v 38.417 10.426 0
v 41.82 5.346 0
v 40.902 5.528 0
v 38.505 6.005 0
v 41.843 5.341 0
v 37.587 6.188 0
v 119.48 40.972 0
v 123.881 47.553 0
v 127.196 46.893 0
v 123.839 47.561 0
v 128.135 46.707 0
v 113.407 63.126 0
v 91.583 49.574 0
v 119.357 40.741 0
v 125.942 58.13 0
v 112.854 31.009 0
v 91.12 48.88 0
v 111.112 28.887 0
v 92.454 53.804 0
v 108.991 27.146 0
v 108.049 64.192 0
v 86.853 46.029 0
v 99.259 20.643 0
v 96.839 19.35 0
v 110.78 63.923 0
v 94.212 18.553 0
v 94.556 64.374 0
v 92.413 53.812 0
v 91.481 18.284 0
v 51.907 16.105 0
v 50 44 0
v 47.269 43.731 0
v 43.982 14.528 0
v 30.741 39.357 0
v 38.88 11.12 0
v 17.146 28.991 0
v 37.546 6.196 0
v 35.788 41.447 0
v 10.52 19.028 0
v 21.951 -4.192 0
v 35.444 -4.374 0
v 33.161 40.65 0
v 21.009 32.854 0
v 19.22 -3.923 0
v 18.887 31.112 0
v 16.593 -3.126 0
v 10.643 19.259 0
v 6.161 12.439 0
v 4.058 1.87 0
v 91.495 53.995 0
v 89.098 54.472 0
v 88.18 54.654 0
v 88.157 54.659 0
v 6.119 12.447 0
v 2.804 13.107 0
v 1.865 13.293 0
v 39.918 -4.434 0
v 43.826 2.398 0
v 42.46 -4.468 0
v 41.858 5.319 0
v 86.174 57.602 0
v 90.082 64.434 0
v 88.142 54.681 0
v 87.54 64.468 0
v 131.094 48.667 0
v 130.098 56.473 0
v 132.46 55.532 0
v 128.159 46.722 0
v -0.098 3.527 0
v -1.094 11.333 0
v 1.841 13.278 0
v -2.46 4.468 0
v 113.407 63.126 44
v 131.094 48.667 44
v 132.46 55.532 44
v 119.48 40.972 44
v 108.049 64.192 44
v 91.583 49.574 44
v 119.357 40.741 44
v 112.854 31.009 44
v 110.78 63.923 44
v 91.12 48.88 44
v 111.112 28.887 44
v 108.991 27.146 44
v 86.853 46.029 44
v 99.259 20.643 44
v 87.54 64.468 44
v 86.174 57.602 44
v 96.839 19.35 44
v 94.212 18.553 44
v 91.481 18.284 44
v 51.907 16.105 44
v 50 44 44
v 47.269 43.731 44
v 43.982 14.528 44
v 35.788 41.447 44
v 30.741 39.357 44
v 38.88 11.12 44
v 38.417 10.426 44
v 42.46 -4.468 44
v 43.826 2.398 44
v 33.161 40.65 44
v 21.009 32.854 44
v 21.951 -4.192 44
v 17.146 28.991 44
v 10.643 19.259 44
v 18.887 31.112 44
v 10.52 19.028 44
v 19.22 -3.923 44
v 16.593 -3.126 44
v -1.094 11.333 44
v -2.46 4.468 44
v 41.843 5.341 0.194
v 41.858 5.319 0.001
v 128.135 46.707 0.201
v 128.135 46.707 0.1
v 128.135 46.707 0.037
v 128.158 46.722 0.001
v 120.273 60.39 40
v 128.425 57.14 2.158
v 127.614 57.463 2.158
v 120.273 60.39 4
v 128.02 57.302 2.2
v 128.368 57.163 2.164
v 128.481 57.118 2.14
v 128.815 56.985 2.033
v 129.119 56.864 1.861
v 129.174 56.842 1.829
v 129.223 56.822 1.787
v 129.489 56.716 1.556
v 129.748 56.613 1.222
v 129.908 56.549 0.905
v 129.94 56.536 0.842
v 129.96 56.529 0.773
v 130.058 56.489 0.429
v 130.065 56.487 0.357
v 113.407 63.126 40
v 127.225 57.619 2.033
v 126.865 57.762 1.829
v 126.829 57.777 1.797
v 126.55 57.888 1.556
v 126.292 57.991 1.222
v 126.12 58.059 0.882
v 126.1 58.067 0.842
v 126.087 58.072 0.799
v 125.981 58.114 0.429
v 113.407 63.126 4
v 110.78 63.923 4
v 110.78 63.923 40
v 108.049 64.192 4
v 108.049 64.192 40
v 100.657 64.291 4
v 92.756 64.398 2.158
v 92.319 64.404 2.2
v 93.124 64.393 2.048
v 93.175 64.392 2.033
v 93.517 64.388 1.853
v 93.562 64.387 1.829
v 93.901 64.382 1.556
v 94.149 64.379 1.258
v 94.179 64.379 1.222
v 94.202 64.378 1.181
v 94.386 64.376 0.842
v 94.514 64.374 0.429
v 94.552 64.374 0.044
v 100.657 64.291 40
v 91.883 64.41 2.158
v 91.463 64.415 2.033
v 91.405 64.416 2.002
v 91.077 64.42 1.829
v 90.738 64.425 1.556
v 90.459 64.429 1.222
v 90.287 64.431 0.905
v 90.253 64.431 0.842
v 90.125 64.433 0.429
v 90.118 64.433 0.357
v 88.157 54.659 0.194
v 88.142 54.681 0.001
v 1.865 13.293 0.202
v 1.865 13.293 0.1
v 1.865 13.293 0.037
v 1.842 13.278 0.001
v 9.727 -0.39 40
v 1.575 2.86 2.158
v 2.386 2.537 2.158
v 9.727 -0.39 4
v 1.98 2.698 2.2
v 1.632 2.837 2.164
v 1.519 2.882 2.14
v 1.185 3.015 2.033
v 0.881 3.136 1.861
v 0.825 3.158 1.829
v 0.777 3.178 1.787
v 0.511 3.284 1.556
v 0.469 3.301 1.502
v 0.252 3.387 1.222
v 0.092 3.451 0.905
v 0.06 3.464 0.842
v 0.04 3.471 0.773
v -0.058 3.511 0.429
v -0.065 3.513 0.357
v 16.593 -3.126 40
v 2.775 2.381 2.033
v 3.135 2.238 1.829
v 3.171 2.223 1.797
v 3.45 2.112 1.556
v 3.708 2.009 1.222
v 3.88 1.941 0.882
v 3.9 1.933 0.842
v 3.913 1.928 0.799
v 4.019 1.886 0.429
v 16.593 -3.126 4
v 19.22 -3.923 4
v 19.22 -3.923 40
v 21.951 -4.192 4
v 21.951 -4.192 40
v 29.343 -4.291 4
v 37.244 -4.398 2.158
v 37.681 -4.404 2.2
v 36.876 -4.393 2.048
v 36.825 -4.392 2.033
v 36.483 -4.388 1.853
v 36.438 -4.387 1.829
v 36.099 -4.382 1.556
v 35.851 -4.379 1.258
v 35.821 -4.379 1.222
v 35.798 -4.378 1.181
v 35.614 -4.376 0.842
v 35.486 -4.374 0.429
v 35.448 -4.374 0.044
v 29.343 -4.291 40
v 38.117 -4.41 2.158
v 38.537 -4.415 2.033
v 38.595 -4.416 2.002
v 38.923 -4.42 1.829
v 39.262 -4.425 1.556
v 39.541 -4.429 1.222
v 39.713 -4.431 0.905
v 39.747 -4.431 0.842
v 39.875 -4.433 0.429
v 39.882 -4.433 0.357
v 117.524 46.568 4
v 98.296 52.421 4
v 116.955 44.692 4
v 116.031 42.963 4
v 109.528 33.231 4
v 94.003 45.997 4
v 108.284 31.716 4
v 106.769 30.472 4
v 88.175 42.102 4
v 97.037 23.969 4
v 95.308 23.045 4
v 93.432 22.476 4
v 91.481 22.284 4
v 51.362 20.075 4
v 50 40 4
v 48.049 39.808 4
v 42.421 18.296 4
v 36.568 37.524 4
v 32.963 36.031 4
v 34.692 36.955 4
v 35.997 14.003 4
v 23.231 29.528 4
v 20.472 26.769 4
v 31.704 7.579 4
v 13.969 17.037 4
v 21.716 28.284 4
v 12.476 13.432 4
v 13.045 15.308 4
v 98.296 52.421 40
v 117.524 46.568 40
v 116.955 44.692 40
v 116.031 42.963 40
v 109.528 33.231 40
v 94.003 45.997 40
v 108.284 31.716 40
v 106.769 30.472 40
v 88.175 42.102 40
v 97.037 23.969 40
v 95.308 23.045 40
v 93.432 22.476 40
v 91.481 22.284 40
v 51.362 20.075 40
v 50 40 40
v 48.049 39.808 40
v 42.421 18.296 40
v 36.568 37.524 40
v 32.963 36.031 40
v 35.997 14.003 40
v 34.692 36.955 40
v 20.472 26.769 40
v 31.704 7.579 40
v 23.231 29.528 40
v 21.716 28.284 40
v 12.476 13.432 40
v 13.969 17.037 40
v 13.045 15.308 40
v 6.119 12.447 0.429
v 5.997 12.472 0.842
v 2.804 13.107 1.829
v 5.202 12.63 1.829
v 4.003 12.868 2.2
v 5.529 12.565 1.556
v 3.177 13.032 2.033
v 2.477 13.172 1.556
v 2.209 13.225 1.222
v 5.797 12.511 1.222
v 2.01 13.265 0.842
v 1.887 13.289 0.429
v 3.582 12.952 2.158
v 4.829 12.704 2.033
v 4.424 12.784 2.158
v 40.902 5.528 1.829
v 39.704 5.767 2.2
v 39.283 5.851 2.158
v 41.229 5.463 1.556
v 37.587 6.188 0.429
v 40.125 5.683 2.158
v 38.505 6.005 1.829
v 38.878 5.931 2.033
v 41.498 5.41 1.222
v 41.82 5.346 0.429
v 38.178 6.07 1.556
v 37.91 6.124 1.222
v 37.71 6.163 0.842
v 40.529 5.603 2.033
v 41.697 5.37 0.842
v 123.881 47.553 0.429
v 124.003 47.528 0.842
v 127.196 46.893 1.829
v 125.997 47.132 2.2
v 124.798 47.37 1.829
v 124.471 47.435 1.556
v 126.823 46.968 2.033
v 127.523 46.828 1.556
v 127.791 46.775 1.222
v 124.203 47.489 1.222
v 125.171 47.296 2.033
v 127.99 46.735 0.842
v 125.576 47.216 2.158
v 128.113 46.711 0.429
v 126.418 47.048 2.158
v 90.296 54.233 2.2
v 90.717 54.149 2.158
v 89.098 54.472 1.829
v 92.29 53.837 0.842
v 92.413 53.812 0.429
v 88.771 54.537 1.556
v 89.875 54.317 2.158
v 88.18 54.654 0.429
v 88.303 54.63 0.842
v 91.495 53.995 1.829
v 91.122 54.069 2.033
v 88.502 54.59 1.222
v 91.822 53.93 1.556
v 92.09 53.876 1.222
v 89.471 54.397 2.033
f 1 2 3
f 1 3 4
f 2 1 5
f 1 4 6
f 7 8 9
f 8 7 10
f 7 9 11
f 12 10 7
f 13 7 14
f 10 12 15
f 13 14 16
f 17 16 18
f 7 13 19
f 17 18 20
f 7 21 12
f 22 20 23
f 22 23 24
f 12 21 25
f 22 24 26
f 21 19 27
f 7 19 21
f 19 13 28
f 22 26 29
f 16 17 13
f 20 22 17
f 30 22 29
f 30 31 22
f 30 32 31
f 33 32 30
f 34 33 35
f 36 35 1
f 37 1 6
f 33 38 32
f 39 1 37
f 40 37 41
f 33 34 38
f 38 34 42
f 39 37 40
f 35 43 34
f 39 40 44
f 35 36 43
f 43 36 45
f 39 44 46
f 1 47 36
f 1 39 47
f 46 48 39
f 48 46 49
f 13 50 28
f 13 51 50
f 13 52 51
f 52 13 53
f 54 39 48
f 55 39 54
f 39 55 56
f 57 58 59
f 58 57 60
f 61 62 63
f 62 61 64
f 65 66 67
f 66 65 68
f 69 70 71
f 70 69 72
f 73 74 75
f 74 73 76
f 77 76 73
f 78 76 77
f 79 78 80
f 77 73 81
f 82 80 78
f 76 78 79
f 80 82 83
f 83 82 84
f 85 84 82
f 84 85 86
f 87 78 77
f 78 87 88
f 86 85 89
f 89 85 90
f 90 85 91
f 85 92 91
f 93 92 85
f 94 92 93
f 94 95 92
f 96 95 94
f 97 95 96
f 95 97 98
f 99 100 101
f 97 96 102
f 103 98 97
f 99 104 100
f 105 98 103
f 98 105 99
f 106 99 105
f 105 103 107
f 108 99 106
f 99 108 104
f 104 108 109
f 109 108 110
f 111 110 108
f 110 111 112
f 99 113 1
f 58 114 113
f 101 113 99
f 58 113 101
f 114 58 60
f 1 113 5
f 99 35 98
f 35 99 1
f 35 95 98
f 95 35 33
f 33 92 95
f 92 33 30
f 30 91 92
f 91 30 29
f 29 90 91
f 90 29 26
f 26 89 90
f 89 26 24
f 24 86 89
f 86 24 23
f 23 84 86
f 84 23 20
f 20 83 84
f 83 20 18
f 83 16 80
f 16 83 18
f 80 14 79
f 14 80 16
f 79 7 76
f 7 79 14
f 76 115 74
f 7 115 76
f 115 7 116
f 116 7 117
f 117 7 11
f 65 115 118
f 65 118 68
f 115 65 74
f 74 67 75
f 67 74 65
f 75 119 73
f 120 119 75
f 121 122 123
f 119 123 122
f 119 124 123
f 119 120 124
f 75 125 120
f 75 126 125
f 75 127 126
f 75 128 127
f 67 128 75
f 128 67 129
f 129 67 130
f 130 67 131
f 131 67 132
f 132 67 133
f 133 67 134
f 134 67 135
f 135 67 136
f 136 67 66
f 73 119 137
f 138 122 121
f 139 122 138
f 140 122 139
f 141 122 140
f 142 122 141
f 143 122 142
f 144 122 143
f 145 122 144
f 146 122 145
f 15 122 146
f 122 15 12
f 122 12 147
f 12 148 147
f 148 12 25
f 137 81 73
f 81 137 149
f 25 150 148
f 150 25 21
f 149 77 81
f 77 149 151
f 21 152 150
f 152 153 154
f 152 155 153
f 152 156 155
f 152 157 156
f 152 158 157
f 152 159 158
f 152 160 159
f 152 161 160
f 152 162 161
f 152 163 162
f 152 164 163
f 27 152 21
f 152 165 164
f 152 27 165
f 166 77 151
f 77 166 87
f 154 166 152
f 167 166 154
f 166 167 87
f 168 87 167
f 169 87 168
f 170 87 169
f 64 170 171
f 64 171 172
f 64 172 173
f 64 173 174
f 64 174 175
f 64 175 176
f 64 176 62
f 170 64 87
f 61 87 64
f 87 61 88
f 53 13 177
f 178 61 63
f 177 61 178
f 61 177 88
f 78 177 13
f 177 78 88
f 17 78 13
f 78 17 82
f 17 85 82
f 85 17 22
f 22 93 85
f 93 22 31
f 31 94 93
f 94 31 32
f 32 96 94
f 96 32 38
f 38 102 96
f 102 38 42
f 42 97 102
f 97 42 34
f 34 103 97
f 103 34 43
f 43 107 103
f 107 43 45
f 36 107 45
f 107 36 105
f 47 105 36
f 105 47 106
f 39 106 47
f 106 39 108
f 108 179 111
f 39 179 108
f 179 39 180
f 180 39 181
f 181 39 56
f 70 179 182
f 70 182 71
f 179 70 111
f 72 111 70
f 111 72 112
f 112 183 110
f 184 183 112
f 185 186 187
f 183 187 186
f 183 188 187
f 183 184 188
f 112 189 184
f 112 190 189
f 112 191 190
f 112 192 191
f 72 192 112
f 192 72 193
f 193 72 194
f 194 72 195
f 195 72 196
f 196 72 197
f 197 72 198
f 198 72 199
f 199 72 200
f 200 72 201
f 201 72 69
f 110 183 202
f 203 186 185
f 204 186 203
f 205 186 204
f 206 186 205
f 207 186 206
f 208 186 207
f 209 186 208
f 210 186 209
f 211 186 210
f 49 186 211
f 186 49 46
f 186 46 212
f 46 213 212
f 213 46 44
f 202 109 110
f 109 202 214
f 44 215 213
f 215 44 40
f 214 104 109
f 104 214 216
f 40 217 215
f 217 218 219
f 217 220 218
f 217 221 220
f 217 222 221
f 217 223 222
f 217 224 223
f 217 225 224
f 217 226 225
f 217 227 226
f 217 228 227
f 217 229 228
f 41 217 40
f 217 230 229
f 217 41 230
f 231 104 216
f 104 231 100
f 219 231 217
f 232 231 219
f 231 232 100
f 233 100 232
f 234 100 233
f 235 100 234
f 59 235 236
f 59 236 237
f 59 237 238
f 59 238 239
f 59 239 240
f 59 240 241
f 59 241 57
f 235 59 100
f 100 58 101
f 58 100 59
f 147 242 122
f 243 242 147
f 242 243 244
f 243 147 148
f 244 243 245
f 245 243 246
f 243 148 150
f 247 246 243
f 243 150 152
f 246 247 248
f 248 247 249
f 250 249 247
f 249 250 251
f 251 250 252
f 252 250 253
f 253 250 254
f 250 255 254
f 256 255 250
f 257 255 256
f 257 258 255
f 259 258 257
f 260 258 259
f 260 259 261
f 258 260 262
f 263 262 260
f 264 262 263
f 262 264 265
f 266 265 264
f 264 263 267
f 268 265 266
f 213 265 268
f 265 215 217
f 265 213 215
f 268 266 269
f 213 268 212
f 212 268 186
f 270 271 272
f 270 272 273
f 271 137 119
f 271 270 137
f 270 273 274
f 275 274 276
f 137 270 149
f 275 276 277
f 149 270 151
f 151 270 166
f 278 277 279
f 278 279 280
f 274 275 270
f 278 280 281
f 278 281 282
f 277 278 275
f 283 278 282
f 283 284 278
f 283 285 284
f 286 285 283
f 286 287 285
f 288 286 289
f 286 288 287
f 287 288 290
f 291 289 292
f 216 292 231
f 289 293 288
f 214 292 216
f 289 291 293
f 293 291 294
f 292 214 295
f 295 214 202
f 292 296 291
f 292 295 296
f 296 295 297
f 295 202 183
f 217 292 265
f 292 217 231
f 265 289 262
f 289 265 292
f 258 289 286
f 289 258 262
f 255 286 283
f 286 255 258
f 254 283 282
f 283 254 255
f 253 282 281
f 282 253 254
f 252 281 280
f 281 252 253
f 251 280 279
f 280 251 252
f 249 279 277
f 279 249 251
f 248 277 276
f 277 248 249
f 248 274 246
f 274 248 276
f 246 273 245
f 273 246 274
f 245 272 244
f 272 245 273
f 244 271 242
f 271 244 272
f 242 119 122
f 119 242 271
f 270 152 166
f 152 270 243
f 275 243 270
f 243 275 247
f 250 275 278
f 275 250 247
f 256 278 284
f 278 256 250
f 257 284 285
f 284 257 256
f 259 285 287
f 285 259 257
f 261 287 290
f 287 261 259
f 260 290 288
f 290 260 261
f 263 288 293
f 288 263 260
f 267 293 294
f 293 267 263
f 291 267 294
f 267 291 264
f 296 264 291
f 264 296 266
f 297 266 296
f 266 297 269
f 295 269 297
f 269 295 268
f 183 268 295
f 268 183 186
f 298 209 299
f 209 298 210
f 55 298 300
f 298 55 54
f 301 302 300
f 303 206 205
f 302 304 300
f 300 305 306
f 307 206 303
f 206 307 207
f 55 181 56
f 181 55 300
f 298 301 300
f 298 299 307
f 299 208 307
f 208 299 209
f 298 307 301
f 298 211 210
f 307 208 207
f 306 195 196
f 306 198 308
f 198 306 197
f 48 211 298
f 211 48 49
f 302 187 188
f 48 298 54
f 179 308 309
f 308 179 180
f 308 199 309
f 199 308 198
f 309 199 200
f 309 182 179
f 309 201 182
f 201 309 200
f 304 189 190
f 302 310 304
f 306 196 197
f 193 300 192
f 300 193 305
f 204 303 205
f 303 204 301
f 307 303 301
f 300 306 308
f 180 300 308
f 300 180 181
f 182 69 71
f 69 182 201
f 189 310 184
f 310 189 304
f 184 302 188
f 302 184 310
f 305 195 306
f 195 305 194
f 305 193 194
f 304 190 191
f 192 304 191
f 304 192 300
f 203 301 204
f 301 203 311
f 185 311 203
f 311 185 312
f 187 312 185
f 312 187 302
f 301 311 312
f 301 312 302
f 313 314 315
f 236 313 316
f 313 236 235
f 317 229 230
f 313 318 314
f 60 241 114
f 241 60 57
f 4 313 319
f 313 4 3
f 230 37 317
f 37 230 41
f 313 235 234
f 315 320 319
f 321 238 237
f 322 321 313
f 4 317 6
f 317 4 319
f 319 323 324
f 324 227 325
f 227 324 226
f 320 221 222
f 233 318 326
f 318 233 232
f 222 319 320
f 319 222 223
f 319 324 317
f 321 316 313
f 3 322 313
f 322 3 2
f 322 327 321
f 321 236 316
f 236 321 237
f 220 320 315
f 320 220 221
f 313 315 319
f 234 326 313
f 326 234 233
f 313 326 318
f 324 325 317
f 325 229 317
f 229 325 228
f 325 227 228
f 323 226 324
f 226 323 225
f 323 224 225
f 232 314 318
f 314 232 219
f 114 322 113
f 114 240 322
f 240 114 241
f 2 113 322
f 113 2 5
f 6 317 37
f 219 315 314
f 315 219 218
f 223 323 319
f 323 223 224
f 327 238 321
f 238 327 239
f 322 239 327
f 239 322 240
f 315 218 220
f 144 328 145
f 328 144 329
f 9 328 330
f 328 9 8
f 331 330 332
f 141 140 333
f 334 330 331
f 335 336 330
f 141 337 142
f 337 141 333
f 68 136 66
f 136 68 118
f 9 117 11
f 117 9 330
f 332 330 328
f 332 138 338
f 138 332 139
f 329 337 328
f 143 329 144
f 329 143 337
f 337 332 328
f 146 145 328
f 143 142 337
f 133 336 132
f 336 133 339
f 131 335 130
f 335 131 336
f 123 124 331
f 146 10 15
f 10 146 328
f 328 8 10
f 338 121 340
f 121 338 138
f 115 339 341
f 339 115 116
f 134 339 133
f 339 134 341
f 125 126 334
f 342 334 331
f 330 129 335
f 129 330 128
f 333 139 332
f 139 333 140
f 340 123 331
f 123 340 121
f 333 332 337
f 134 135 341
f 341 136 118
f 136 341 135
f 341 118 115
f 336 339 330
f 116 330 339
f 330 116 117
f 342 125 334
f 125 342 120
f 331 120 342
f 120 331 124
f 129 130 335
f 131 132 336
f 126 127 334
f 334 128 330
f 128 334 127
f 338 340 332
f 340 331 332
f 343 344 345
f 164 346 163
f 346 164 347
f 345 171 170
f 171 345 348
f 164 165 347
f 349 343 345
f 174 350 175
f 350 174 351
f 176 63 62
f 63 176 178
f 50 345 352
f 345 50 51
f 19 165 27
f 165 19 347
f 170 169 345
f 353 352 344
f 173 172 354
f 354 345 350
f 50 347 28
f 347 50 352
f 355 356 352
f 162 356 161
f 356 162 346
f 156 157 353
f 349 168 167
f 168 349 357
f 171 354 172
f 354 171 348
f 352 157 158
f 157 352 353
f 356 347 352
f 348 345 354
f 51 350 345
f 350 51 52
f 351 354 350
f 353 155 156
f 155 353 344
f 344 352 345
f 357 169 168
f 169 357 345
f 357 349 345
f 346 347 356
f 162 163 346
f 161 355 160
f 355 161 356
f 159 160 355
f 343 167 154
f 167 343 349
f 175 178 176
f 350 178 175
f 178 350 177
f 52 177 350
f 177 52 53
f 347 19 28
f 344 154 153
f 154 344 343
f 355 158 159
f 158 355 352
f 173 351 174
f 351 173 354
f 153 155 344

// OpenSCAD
$fn = 32;

// ----------------------------------------------------------------------
// Air duct: 28 mm duct, 4 mm wall, 44 mm across
// ----------------------------------------------------------------------

// --- parameters (mm) ---
duct_r = 14;              // duct core radius
duct_d = 28;              // duct core diameter
wall = 4;                 // duct wall thickness
height = 44;              // duct width (extrusion height)
port_r = 22.9;            // port flange half width
port_d = 45.8;            // port flange width
port_t = 7;               // port flange thickness
bolt_d = 4.4;             // port bolt holes
bolt_offset = 18.2;       // bolt hole offset from the port axis

difference() {
  /* outer hull chain: tube with a flat flange plate at every port */
  linear_extrude(height = 44) {
    hull() {
      polygon([[42.46, -4.468], [-2.46, 4.468], [-1.094, 11.333], [43.826, 2.398]]);
      translate([21.951, 9.808]) circle(r = 14);
    }
    hull() {
      translate([21.951, 9.808]) circle(r = 14);
      translate([22.284, 11.481]) circle(r = 14);
    }
    hull() {
      translate([22.284, 11.481]) circle(r = 14);
      translate([28.787, 21.213]) circle(r = 14);
    }
    hull() {
      translate([28.787, 21.213]) circle(r = 14);
      translate([38.519, 27.716]) circle(r = 14);
    }
    hull() {
      translate([38.519, 27.716]) circle(r = 14);
      translate([50, 30]) circle(r = 14);
    }
    hull() {
      translate([50, 30]) circle(r = 14);
      translate([91.481, 32.284]) circle(r = 14);
    }
    hull() {
      translate([91.481, 32.284]) circle(r = 14);
      translate([101.213, 38.787]) circle(r = 14);
    }
    hull() {
      translate([101.213, 38.787]) circle(r = 14);
      translate([107.716, 48.519]) circle(r = 14);
    }
    hull() {
      translate([107.716, 48.519]) circle(r = 14);
      translate([108.049, 50.192]) circle(r = 14);
    }
    hull() {
      translate([108.049, 50.192]) circle(r = 14);
      polygon([[87.54, 64.468], [132.46, 55.532], [131.094, 48.667], [86.174, 57.602]]);
    }
  }
  /* air passage: the same chain inset by the wall, 5 mm proud of the ports */
  translate([0, 0, 4]) linear_extrude(height = 36) {
    hull() {
      translate([19.025, -4.904]) circle(r = 10);
      translate([22.284, 11.481]) circle(r = 10);
    }
    hull() {
      translate([22.284, 11.481]) circle(r = 10);
      translate([28.787, 21.213]) circle(r = 10);
    }
    hull() {
      translate([28.787, 21.213]) circle(r = 10);
      translate([38.519, 27.716]) circle(r = 10);
    }
    hull() {
      translate([38.519, 27.716]) circle(r = 10);
      translate([50, 30]) circle(r = 10);
    }
    hull() {
      translate([50, 30]) circle(r = 10);
      translate([91.481, 32.284]) circle(r = 10);
    }
    hull() {
      translate([91.481, 32.284]) circle(r = 10);
      translate([101.213, 38.787]) circle(r = 10);
    }
    hull() {
      translate([101.213, 38.787]) circle(r = 10);
      translate([107.716, 48.519]) circle(r = 10);
    }
    hull() {
      translate([107.716, 48.519]) circle(r = 10);
      translate([110.975, 64.904]) circle(r = 10);
    }
  }
  translate([20, 0]) rotate([0, 0, -11.25]) translate([-18.2, -2.5]) rotate([-90, 0, 0]) cylinder(h = 12, d = 4.4);
  translate([20, 0]) rotate([0, 0, -11.25]) translate([18.2, -2.5]) rotate([-90, 0, 0]) cylinder(h = 12, d = 4.4);
  translate([110, 60]) rotate([0, 0, 168.75]) translate([-18.2, -2.5]) rotate([-90, 0, 0]) cylinder(h = 12, d = 4.4);
  translate([110, 60]) rotate([0, 0, 168.75]) translate([18.2, -2.5]) rotate([-90, 0, 0]) cylinder(h = 12, d = 4.4);
}
